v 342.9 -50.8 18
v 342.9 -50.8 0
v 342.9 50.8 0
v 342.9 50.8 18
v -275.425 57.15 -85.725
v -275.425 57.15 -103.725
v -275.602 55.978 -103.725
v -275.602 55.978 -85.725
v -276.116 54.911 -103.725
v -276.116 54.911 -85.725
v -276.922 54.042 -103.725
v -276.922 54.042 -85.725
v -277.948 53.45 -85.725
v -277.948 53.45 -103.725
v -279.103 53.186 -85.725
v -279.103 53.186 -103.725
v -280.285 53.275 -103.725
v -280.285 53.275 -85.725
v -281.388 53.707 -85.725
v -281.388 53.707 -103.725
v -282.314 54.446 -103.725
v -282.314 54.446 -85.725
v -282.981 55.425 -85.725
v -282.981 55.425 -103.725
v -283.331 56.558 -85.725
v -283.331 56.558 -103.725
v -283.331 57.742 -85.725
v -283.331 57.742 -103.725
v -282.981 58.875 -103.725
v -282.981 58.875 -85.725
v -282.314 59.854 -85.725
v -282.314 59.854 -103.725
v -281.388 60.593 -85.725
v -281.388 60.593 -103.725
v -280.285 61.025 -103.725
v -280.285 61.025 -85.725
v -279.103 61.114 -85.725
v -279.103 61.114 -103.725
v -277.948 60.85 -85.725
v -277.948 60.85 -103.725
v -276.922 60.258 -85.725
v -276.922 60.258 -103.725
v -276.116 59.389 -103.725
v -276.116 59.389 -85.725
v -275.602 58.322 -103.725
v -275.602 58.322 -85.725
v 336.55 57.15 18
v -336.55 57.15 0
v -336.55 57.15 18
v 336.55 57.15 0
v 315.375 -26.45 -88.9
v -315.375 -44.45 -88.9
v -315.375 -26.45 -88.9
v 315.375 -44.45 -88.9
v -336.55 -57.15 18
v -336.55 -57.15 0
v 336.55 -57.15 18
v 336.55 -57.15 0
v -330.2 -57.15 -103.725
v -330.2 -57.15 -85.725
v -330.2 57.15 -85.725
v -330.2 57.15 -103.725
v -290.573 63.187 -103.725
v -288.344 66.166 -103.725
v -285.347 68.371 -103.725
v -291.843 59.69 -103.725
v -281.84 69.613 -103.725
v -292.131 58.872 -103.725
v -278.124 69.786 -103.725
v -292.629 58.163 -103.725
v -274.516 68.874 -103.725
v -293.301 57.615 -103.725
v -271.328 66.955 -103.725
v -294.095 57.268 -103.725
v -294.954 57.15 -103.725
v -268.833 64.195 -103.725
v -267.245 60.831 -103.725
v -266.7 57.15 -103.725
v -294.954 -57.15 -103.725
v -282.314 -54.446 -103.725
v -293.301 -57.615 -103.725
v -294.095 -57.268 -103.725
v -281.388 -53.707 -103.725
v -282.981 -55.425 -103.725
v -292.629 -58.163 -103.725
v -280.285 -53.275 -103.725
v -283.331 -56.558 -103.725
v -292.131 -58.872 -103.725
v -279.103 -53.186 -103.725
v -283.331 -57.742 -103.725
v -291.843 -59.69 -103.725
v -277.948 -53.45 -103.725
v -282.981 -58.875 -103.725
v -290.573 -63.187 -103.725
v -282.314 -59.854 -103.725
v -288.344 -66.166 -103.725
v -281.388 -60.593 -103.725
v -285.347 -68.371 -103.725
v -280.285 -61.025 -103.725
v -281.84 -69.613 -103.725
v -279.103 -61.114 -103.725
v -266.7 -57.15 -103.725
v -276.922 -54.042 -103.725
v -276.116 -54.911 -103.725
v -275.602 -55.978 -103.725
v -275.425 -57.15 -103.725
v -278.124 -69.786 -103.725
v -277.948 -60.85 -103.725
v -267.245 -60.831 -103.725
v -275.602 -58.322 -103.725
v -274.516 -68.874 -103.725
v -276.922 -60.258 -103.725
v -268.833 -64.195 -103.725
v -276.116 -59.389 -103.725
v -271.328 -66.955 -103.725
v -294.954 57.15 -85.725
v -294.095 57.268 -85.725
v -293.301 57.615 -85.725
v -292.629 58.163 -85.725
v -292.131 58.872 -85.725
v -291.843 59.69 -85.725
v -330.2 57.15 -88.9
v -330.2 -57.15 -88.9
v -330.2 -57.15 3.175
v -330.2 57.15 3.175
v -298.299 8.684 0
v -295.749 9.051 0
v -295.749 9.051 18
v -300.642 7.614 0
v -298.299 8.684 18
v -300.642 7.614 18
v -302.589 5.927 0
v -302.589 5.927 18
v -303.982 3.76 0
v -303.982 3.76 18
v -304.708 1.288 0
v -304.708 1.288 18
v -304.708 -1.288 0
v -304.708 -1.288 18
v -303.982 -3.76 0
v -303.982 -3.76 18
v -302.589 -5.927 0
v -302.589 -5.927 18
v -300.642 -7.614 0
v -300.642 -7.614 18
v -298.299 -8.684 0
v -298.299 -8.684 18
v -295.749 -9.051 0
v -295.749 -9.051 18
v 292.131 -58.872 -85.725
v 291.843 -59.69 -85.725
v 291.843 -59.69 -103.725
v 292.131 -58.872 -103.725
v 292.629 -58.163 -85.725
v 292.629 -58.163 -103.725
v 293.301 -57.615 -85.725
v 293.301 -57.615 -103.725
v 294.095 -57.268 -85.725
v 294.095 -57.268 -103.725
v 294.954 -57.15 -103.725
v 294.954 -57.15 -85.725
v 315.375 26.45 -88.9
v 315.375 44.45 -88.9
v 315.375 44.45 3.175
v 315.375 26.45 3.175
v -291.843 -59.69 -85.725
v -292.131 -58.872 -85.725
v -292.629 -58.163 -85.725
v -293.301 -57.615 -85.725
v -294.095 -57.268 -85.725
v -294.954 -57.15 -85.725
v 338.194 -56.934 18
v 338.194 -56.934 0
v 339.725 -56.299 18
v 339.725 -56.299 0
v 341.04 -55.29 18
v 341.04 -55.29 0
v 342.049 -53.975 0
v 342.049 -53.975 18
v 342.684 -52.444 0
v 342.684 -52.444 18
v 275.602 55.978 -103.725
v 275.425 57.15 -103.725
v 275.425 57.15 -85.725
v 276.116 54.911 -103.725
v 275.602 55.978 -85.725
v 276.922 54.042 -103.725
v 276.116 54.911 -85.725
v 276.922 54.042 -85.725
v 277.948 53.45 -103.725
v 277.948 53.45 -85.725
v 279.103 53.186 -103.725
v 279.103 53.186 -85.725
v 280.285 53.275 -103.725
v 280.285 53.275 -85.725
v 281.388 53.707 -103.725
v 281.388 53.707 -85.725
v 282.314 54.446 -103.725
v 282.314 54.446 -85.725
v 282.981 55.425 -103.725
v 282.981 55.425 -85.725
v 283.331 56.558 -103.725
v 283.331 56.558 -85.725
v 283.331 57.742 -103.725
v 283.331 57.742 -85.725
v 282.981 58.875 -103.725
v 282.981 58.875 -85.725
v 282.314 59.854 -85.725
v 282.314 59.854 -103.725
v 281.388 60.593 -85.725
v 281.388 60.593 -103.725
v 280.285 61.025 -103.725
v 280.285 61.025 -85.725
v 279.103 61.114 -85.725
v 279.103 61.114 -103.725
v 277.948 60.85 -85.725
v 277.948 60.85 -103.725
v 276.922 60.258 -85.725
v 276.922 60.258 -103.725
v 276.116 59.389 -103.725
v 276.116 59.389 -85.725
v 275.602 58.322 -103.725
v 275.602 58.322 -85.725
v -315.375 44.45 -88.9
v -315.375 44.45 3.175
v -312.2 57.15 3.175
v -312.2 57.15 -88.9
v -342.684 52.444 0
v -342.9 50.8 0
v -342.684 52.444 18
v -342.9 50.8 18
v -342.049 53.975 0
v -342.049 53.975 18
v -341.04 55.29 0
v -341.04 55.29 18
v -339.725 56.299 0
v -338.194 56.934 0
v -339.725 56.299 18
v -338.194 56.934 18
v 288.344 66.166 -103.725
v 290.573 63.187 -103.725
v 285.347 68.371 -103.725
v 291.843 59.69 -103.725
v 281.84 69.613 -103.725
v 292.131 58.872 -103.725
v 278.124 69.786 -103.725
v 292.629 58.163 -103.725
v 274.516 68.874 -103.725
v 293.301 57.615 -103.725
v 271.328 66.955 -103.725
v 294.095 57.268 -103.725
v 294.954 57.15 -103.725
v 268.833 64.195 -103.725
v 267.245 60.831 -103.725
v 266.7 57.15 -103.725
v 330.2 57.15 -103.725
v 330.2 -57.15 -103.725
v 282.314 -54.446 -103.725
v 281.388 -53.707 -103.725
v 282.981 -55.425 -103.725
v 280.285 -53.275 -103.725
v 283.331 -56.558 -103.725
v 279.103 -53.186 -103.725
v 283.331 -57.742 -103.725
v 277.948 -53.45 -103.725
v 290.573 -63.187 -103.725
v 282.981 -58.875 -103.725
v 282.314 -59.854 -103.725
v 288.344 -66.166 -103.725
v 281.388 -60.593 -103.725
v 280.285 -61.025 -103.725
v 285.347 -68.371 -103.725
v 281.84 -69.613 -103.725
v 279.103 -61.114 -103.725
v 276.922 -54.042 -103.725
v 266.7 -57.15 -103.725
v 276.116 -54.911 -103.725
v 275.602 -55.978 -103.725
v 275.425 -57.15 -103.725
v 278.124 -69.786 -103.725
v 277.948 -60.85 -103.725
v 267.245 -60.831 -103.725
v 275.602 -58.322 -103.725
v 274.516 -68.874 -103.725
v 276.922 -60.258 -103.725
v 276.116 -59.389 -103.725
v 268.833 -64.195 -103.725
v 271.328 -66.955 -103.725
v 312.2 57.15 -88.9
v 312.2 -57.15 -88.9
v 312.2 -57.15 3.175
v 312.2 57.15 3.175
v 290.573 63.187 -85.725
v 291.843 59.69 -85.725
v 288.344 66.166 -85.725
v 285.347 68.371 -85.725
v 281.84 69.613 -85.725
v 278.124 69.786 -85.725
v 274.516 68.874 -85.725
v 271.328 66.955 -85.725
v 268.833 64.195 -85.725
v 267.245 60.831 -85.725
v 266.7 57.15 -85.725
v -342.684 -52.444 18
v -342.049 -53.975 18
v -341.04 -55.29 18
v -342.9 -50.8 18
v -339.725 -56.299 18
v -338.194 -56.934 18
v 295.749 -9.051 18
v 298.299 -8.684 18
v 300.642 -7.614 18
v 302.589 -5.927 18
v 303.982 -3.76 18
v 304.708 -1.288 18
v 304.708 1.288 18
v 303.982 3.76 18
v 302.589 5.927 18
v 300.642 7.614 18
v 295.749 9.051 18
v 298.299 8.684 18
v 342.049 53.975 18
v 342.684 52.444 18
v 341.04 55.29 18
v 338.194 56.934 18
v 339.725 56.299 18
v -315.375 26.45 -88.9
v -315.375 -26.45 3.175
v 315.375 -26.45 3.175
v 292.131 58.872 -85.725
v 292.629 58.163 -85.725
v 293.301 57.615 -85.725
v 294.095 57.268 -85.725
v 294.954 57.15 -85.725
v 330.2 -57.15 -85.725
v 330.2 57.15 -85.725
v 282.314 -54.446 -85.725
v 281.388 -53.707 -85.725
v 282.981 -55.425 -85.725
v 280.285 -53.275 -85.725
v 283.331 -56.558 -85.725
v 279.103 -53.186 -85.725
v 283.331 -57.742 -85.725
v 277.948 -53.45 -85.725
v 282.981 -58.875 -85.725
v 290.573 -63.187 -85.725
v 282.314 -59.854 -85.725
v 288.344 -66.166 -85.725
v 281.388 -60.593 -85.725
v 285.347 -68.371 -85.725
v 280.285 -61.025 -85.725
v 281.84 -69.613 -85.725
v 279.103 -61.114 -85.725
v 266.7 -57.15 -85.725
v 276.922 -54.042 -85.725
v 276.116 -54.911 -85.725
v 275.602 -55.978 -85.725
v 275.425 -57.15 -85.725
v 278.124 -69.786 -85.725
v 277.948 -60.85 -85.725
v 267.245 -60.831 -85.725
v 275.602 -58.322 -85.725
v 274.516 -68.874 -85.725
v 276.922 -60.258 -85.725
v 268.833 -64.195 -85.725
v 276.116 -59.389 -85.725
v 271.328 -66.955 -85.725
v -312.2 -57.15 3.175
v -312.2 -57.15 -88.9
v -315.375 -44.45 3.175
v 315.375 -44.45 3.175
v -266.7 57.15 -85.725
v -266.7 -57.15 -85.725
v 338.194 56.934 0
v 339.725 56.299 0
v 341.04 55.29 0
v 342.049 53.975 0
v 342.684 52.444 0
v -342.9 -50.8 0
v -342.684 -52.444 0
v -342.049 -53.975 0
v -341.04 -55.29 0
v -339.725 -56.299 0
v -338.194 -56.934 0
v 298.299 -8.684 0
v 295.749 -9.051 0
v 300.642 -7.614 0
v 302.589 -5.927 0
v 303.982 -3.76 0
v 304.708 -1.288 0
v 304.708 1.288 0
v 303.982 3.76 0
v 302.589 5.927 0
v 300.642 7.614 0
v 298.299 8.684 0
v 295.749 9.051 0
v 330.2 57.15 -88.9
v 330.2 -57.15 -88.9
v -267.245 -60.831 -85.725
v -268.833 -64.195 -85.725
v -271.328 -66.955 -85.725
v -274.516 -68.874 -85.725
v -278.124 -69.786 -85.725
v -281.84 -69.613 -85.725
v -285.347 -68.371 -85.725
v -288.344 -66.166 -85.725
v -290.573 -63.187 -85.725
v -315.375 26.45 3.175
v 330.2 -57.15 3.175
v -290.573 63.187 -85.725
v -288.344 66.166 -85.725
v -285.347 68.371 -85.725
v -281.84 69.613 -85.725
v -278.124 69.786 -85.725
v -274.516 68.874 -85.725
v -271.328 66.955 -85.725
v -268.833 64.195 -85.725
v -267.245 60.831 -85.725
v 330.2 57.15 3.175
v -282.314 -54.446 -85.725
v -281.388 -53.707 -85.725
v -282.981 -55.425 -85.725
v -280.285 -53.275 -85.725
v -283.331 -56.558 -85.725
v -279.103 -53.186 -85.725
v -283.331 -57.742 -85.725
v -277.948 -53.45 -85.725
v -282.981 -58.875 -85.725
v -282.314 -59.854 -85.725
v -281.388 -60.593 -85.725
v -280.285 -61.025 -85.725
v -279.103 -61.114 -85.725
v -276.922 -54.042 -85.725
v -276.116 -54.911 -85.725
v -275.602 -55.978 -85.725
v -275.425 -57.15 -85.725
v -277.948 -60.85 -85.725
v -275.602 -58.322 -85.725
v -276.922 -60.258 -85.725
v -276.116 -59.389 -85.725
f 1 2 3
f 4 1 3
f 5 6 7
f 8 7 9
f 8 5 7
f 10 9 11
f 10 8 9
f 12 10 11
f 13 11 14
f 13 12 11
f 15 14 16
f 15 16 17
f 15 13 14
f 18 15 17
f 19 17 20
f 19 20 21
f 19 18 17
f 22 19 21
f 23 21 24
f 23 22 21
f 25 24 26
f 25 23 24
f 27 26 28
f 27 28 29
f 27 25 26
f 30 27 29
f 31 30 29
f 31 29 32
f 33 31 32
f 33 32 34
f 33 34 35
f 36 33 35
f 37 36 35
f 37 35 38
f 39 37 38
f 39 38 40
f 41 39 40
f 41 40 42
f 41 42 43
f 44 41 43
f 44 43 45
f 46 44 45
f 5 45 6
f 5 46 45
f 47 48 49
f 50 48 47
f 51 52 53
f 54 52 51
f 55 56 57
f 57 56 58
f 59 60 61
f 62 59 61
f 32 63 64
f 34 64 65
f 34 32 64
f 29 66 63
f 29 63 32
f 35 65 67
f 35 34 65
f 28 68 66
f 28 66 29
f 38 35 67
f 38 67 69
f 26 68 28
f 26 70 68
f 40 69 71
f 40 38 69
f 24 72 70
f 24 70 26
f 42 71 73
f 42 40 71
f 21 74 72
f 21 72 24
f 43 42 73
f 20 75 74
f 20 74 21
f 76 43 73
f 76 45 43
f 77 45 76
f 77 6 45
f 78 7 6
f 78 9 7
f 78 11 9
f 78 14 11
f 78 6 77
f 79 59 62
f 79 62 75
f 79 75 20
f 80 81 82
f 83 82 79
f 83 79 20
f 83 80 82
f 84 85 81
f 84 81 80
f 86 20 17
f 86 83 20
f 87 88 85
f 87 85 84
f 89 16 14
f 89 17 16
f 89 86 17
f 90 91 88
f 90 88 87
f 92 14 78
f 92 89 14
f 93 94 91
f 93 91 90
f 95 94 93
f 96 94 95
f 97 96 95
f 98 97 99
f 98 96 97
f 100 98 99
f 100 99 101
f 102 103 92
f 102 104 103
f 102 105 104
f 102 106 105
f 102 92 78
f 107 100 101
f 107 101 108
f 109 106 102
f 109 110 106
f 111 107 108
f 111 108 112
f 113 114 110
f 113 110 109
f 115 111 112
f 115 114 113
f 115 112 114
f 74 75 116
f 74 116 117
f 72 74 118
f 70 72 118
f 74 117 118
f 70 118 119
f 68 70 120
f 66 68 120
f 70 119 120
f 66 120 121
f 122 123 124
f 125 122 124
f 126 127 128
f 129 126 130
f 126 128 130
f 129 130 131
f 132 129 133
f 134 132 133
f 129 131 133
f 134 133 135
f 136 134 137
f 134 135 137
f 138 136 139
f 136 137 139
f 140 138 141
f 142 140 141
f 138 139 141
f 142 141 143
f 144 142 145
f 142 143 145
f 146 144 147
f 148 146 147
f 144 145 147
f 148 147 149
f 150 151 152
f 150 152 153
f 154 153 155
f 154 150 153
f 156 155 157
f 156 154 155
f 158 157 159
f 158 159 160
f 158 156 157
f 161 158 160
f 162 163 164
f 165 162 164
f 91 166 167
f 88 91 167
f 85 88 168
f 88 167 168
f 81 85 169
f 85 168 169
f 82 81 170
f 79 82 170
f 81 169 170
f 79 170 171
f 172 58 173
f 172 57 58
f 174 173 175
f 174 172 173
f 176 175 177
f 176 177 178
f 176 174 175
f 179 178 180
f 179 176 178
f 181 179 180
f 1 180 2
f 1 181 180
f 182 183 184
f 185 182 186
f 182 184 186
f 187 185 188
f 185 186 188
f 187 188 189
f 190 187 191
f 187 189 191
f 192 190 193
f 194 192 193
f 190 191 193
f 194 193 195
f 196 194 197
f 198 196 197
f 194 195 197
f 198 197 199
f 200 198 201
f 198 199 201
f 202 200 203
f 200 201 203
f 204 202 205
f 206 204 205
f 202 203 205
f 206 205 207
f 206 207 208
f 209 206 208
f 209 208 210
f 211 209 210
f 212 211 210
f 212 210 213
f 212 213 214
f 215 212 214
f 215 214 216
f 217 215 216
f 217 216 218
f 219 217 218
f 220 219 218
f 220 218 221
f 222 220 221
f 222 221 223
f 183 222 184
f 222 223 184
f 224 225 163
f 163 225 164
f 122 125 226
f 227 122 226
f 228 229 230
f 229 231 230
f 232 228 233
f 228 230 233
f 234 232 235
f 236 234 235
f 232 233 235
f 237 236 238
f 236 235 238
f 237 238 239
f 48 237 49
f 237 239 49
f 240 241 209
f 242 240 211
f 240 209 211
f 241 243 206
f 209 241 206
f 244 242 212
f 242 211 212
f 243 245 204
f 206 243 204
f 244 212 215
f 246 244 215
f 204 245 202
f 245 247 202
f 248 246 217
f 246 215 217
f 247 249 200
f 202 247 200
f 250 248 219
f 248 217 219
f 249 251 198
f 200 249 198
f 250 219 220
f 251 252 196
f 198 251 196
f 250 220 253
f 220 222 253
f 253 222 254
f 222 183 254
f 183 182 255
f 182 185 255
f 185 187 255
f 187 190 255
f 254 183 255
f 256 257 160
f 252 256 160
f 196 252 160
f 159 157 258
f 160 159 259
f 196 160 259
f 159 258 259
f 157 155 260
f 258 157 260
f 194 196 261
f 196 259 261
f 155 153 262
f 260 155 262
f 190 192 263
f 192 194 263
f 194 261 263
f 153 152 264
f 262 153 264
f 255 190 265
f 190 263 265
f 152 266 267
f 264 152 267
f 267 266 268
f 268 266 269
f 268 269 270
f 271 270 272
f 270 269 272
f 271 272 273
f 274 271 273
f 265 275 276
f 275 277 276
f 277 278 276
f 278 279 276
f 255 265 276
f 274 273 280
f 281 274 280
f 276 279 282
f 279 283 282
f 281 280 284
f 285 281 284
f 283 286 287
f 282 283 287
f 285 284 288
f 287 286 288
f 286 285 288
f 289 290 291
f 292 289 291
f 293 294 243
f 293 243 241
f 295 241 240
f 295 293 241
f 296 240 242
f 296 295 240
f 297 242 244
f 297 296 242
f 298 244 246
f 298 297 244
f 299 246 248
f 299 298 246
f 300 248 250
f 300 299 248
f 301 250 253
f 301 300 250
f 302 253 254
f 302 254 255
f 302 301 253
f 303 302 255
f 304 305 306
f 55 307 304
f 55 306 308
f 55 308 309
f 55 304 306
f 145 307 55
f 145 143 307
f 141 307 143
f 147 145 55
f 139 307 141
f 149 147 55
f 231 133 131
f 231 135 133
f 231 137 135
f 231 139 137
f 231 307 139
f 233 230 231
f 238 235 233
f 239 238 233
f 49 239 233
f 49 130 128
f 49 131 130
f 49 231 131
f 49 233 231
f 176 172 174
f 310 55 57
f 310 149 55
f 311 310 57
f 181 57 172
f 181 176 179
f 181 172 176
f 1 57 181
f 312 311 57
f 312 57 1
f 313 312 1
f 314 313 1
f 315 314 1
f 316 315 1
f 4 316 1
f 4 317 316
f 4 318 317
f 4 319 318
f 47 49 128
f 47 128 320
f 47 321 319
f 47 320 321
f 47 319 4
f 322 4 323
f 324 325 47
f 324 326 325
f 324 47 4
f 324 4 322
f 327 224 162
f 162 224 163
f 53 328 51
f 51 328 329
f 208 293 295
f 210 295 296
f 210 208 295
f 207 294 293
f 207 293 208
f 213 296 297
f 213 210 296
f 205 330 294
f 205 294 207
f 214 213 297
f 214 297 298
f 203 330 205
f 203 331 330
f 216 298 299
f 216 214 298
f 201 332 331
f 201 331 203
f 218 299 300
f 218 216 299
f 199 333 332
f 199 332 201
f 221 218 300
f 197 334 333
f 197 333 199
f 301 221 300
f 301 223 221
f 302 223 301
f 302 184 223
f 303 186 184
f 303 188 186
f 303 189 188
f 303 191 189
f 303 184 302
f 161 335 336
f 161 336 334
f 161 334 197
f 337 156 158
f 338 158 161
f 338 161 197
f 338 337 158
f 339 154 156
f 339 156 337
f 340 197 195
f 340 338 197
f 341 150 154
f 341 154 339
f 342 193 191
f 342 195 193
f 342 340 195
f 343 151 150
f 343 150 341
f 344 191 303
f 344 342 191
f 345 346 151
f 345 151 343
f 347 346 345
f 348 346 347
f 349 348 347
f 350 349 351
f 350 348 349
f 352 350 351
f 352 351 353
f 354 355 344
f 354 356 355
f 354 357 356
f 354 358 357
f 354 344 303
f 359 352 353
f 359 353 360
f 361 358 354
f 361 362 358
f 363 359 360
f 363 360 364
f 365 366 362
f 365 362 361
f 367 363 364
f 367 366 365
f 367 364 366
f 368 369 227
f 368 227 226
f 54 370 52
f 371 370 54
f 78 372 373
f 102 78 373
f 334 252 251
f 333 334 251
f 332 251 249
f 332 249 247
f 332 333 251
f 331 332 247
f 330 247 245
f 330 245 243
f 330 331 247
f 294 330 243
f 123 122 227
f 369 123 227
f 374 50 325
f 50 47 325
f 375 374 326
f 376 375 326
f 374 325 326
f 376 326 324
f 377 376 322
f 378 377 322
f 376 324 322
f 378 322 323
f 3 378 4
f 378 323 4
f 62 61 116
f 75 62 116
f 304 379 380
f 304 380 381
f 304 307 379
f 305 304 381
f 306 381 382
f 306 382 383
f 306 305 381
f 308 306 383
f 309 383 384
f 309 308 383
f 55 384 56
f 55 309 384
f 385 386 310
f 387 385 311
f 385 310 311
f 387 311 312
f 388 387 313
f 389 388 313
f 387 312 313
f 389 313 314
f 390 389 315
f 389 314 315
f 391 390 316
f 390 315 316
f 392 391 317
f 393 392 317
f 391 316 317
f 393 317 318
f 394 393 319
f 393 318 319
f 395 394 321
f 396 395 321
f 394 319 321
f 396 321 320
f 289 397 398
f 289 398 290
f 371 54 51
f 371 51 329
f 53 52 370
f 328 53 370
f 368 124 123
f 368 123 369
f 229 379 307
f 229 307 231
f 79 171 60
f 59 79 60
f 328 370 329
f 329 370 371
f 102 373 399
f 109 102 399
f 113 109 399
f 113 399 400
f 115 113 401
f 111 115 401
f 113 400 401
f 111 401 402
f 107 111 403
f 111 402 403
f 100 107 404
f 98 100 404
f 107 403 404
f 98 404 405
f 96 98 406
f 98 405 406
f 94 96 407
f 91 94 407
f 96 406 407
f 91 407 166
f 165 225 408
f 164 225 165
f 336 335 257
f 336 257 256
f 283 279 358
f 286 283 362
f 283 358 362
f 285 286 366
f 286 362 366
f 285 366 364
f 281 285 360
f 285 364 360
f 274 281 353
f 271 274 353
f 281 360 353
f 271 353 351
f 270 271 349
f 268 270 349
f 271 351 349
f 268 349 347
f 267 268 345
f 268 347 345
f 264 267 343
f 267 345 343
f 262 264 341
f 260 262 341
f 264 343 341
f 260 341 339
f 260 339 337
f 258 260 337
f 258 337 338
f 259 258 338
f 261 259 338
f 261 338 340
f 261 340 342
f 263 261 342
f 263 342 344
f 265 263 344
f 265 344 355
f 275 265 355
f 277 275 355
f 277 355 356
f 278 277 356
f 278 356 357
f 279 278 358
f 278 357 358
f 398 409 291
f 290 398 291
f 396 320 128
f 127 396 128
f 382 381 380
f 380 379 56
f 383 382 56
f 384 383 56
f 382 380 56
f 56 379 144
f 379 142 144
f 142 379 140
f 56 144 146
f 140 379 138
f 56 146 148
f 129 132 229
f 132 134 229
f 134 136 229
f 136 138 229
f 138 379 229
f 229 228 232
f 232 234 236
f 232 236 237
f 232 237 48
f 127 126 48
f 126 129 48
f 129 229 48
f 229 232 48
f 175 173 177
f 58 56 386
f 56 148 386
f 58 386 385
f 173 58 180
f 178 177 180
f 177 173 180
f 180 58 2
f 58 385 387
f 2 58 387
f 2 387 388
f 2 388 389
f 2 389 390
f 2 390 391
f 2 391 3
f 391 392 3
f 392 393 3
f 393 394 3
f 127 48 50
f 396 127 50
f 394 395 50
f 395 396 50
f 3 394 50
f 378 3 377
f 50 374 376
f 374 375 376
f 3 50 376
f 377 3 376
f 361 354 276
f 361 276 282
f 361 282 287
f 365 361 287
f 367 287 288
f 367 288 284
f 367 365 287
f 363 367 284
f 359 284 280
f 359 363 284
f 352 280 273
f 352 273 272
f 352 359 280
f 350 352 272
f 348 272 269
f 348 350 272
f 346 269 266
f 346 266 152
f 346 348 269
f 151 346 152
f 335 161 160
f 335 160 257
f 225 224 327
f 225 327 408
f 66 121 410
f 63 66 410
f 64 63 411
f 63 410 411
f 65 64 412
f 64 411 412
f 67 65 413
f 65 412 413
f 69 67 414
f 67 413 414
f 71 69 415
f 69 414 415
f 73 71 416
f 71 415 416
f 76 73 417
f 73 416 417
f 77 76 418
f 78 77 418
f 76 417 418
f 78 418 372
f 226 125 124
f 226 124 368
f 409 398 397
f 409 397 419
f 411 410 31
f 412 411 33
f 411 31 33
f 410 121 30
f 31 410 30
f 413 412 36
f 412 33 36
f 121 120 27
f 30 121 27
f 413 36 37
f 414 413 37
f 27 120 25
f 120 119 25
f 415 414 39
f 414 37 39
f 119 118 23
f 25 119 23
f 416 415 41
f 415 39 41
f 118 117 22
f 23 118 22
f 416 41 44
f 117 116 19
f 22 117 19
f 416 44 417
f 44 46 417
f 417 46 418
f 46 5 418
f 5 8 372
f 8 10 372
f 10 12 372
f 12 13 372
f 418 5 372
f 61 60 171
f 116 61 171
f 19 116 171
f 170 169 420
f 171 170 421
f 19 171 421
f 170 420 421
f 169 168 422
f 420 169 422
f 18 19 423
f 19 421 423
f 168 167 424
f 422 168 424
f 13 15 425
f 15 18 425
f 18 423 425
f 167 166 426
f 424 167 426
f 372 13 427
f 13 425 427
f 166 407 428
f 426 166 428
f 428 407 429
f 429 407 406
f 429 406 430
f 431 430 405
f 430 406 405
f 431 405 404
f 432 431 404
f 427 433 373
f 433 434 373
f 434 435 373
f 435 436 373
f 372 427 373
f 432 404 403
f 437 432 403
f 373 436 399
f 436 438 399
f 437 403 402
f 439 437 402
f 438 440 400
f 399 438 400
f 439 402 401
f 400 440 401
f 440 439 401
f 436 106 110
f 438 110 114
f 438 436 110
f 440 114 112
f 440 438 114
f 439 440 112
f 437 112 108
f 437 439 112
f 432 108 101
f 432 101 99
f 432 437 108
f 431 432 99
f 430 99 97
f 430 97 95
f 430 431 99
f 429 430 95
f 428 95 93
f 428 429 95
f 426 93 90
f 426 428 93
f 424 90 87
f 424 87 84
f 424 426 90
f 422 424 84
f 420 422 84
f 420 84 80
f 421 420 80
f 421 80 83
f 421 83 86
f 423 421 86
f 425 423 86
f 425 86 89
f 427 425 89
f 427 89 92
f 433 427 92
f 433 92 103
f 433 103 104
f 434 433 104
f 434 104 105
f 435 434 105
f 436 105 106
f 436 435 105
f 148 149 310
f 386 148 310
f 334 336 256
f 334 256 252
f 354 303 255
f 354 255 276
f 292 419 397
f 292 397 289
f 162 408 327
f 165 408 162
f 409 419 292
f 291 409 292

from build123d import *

# Parameters (mm, degrees)
F0_W      = 685.8
F0_H      = 114.3
F2_DEPTH  = 18
F4_DEPTH  = 18.001
F5_R      = 6.35
F6_W      = 18
F6_H      = 92.075
F7_DEPTH  = 114.3
F10_W     = 630.75
F10_H     = 92.075
F11_DEPTH = 18
F14_R     = 3.9751
F15_DEPTH = 18


with BuildPart() as f2:
    # F0 (on Top) → F2 (new body)
    with BuildSketch(Plane.XY):
        Rectangle(F0_W, F0_H)
    extrude(amount=F2_DEPTH)

    # F3 (on face) → F4 (cut, through all)
    with BuildSketch(Plane.XY.offset(18)):
        with BuildLine():
            Line((295.7492, 9.0508), (-295.7492, 9.0508))
            ThreePointArc((-295.7492, 9.0508), (-304.8, 0), (-295.7492, -9.0508))
            Line((-295.7492, -9.0508), (295.7492, -9.0508))
            ThreePointArc((295.7492, -9.0508), (304.8, 0), (295.7492, 9.0508))
        make_face()
    extrude(amount=-F4_DEPTH, mode=Mode.SUBTRACT)

    # F5
    f5_edges = [f2.edges().sort_by_distance(p)[0] for p in [
        (-342.9, -57.15, 9),
        (-342.9, 57.15, 9),
        (342.9, 57.15, 9),
        (342.9, -57.15, 9),
    ]]
    fillet(f5_edges, radius=F5_R)


with BuildPart() as f7:
    # F6 (on face) → F7 (new body, through all)
    with BuildSketch(Plane.XZ.offset(57.15)):
        with Locations((-321.2, -42.8625)):
            Rectangle(F6_W, F6_H)
    extrude(amount=-F7_DEPTH)


with BuildPart() as f8_1:
    # F8: instance of F7
    add(f7.part.mirror(Plane.YZ))


with BuildPart() as f11:
    # F10 (on offset) → F11 (new body)
    with BuildSketch(Plane.XZ.offset(44.45)):
        with Locations((0, -42.8625)):
            Rectangle(F10_W, F10_H)
    extrude(amount=-F11_DEPTH)


with BuildPart() as f12_1:
    # F12: instance of F11
    add(f11.part.mirror(Plane.XZ))


with BuildPart() as f15:
    # F14 (on offset) → F15 (new body)
    with BuildSketch(Plane(origin=(0, 0, -85.725), x_dir=(1, 0, 0), z_dir=(0, 0, -1))):
        with BuildLine():
            Line((-294.9542598667, 57.15), (-330.2, 57.15))
            Line((-330.2, 57.15), (-330.2, -57.15))
            Line((-330.2, -57.15), (-294.9542598667, -57.15))
            ThreePointArc((-294.9542598667, -57.15), (-292.9462135525, -57.8656555751), (-291.8434078933, -59.69))
            ThreePointArc((-291.8434078933, -59.69), (-278.1235361825, -69.7856891431), (-266.7, -57.15))
            Line((-266.7, -57.15), (-266.7, 57.15))
            ThreePointArc((-266.7, 57.15), (-278.1235361825, 69.7856891432), (-291.8434078933, 59.69))
            ThreePointArc((-291.8434078933, 59.69), (-292.9462135525, 57.8656555752), (-294.9542598667, 57.15))
        make_face()
        with Locations((-279.4, -57.15)):
            Circle(F14_R, mode=Mode.SUBTRACT)
        with Locations((-279.4, 57.15)):
            Circle(F14_R, mode=Mode.SUBTRACT)
    extrude(amount=F15_DEPTH)


with BuildPart() as f16_1:
    # F16: instance of F15
    add(f15.part.mirror(Plane.YZ))


solid = Compound([f2.part, f7.part, f8_1.part, f11.part, f12_1.part, f15.part, f16_1.part])
